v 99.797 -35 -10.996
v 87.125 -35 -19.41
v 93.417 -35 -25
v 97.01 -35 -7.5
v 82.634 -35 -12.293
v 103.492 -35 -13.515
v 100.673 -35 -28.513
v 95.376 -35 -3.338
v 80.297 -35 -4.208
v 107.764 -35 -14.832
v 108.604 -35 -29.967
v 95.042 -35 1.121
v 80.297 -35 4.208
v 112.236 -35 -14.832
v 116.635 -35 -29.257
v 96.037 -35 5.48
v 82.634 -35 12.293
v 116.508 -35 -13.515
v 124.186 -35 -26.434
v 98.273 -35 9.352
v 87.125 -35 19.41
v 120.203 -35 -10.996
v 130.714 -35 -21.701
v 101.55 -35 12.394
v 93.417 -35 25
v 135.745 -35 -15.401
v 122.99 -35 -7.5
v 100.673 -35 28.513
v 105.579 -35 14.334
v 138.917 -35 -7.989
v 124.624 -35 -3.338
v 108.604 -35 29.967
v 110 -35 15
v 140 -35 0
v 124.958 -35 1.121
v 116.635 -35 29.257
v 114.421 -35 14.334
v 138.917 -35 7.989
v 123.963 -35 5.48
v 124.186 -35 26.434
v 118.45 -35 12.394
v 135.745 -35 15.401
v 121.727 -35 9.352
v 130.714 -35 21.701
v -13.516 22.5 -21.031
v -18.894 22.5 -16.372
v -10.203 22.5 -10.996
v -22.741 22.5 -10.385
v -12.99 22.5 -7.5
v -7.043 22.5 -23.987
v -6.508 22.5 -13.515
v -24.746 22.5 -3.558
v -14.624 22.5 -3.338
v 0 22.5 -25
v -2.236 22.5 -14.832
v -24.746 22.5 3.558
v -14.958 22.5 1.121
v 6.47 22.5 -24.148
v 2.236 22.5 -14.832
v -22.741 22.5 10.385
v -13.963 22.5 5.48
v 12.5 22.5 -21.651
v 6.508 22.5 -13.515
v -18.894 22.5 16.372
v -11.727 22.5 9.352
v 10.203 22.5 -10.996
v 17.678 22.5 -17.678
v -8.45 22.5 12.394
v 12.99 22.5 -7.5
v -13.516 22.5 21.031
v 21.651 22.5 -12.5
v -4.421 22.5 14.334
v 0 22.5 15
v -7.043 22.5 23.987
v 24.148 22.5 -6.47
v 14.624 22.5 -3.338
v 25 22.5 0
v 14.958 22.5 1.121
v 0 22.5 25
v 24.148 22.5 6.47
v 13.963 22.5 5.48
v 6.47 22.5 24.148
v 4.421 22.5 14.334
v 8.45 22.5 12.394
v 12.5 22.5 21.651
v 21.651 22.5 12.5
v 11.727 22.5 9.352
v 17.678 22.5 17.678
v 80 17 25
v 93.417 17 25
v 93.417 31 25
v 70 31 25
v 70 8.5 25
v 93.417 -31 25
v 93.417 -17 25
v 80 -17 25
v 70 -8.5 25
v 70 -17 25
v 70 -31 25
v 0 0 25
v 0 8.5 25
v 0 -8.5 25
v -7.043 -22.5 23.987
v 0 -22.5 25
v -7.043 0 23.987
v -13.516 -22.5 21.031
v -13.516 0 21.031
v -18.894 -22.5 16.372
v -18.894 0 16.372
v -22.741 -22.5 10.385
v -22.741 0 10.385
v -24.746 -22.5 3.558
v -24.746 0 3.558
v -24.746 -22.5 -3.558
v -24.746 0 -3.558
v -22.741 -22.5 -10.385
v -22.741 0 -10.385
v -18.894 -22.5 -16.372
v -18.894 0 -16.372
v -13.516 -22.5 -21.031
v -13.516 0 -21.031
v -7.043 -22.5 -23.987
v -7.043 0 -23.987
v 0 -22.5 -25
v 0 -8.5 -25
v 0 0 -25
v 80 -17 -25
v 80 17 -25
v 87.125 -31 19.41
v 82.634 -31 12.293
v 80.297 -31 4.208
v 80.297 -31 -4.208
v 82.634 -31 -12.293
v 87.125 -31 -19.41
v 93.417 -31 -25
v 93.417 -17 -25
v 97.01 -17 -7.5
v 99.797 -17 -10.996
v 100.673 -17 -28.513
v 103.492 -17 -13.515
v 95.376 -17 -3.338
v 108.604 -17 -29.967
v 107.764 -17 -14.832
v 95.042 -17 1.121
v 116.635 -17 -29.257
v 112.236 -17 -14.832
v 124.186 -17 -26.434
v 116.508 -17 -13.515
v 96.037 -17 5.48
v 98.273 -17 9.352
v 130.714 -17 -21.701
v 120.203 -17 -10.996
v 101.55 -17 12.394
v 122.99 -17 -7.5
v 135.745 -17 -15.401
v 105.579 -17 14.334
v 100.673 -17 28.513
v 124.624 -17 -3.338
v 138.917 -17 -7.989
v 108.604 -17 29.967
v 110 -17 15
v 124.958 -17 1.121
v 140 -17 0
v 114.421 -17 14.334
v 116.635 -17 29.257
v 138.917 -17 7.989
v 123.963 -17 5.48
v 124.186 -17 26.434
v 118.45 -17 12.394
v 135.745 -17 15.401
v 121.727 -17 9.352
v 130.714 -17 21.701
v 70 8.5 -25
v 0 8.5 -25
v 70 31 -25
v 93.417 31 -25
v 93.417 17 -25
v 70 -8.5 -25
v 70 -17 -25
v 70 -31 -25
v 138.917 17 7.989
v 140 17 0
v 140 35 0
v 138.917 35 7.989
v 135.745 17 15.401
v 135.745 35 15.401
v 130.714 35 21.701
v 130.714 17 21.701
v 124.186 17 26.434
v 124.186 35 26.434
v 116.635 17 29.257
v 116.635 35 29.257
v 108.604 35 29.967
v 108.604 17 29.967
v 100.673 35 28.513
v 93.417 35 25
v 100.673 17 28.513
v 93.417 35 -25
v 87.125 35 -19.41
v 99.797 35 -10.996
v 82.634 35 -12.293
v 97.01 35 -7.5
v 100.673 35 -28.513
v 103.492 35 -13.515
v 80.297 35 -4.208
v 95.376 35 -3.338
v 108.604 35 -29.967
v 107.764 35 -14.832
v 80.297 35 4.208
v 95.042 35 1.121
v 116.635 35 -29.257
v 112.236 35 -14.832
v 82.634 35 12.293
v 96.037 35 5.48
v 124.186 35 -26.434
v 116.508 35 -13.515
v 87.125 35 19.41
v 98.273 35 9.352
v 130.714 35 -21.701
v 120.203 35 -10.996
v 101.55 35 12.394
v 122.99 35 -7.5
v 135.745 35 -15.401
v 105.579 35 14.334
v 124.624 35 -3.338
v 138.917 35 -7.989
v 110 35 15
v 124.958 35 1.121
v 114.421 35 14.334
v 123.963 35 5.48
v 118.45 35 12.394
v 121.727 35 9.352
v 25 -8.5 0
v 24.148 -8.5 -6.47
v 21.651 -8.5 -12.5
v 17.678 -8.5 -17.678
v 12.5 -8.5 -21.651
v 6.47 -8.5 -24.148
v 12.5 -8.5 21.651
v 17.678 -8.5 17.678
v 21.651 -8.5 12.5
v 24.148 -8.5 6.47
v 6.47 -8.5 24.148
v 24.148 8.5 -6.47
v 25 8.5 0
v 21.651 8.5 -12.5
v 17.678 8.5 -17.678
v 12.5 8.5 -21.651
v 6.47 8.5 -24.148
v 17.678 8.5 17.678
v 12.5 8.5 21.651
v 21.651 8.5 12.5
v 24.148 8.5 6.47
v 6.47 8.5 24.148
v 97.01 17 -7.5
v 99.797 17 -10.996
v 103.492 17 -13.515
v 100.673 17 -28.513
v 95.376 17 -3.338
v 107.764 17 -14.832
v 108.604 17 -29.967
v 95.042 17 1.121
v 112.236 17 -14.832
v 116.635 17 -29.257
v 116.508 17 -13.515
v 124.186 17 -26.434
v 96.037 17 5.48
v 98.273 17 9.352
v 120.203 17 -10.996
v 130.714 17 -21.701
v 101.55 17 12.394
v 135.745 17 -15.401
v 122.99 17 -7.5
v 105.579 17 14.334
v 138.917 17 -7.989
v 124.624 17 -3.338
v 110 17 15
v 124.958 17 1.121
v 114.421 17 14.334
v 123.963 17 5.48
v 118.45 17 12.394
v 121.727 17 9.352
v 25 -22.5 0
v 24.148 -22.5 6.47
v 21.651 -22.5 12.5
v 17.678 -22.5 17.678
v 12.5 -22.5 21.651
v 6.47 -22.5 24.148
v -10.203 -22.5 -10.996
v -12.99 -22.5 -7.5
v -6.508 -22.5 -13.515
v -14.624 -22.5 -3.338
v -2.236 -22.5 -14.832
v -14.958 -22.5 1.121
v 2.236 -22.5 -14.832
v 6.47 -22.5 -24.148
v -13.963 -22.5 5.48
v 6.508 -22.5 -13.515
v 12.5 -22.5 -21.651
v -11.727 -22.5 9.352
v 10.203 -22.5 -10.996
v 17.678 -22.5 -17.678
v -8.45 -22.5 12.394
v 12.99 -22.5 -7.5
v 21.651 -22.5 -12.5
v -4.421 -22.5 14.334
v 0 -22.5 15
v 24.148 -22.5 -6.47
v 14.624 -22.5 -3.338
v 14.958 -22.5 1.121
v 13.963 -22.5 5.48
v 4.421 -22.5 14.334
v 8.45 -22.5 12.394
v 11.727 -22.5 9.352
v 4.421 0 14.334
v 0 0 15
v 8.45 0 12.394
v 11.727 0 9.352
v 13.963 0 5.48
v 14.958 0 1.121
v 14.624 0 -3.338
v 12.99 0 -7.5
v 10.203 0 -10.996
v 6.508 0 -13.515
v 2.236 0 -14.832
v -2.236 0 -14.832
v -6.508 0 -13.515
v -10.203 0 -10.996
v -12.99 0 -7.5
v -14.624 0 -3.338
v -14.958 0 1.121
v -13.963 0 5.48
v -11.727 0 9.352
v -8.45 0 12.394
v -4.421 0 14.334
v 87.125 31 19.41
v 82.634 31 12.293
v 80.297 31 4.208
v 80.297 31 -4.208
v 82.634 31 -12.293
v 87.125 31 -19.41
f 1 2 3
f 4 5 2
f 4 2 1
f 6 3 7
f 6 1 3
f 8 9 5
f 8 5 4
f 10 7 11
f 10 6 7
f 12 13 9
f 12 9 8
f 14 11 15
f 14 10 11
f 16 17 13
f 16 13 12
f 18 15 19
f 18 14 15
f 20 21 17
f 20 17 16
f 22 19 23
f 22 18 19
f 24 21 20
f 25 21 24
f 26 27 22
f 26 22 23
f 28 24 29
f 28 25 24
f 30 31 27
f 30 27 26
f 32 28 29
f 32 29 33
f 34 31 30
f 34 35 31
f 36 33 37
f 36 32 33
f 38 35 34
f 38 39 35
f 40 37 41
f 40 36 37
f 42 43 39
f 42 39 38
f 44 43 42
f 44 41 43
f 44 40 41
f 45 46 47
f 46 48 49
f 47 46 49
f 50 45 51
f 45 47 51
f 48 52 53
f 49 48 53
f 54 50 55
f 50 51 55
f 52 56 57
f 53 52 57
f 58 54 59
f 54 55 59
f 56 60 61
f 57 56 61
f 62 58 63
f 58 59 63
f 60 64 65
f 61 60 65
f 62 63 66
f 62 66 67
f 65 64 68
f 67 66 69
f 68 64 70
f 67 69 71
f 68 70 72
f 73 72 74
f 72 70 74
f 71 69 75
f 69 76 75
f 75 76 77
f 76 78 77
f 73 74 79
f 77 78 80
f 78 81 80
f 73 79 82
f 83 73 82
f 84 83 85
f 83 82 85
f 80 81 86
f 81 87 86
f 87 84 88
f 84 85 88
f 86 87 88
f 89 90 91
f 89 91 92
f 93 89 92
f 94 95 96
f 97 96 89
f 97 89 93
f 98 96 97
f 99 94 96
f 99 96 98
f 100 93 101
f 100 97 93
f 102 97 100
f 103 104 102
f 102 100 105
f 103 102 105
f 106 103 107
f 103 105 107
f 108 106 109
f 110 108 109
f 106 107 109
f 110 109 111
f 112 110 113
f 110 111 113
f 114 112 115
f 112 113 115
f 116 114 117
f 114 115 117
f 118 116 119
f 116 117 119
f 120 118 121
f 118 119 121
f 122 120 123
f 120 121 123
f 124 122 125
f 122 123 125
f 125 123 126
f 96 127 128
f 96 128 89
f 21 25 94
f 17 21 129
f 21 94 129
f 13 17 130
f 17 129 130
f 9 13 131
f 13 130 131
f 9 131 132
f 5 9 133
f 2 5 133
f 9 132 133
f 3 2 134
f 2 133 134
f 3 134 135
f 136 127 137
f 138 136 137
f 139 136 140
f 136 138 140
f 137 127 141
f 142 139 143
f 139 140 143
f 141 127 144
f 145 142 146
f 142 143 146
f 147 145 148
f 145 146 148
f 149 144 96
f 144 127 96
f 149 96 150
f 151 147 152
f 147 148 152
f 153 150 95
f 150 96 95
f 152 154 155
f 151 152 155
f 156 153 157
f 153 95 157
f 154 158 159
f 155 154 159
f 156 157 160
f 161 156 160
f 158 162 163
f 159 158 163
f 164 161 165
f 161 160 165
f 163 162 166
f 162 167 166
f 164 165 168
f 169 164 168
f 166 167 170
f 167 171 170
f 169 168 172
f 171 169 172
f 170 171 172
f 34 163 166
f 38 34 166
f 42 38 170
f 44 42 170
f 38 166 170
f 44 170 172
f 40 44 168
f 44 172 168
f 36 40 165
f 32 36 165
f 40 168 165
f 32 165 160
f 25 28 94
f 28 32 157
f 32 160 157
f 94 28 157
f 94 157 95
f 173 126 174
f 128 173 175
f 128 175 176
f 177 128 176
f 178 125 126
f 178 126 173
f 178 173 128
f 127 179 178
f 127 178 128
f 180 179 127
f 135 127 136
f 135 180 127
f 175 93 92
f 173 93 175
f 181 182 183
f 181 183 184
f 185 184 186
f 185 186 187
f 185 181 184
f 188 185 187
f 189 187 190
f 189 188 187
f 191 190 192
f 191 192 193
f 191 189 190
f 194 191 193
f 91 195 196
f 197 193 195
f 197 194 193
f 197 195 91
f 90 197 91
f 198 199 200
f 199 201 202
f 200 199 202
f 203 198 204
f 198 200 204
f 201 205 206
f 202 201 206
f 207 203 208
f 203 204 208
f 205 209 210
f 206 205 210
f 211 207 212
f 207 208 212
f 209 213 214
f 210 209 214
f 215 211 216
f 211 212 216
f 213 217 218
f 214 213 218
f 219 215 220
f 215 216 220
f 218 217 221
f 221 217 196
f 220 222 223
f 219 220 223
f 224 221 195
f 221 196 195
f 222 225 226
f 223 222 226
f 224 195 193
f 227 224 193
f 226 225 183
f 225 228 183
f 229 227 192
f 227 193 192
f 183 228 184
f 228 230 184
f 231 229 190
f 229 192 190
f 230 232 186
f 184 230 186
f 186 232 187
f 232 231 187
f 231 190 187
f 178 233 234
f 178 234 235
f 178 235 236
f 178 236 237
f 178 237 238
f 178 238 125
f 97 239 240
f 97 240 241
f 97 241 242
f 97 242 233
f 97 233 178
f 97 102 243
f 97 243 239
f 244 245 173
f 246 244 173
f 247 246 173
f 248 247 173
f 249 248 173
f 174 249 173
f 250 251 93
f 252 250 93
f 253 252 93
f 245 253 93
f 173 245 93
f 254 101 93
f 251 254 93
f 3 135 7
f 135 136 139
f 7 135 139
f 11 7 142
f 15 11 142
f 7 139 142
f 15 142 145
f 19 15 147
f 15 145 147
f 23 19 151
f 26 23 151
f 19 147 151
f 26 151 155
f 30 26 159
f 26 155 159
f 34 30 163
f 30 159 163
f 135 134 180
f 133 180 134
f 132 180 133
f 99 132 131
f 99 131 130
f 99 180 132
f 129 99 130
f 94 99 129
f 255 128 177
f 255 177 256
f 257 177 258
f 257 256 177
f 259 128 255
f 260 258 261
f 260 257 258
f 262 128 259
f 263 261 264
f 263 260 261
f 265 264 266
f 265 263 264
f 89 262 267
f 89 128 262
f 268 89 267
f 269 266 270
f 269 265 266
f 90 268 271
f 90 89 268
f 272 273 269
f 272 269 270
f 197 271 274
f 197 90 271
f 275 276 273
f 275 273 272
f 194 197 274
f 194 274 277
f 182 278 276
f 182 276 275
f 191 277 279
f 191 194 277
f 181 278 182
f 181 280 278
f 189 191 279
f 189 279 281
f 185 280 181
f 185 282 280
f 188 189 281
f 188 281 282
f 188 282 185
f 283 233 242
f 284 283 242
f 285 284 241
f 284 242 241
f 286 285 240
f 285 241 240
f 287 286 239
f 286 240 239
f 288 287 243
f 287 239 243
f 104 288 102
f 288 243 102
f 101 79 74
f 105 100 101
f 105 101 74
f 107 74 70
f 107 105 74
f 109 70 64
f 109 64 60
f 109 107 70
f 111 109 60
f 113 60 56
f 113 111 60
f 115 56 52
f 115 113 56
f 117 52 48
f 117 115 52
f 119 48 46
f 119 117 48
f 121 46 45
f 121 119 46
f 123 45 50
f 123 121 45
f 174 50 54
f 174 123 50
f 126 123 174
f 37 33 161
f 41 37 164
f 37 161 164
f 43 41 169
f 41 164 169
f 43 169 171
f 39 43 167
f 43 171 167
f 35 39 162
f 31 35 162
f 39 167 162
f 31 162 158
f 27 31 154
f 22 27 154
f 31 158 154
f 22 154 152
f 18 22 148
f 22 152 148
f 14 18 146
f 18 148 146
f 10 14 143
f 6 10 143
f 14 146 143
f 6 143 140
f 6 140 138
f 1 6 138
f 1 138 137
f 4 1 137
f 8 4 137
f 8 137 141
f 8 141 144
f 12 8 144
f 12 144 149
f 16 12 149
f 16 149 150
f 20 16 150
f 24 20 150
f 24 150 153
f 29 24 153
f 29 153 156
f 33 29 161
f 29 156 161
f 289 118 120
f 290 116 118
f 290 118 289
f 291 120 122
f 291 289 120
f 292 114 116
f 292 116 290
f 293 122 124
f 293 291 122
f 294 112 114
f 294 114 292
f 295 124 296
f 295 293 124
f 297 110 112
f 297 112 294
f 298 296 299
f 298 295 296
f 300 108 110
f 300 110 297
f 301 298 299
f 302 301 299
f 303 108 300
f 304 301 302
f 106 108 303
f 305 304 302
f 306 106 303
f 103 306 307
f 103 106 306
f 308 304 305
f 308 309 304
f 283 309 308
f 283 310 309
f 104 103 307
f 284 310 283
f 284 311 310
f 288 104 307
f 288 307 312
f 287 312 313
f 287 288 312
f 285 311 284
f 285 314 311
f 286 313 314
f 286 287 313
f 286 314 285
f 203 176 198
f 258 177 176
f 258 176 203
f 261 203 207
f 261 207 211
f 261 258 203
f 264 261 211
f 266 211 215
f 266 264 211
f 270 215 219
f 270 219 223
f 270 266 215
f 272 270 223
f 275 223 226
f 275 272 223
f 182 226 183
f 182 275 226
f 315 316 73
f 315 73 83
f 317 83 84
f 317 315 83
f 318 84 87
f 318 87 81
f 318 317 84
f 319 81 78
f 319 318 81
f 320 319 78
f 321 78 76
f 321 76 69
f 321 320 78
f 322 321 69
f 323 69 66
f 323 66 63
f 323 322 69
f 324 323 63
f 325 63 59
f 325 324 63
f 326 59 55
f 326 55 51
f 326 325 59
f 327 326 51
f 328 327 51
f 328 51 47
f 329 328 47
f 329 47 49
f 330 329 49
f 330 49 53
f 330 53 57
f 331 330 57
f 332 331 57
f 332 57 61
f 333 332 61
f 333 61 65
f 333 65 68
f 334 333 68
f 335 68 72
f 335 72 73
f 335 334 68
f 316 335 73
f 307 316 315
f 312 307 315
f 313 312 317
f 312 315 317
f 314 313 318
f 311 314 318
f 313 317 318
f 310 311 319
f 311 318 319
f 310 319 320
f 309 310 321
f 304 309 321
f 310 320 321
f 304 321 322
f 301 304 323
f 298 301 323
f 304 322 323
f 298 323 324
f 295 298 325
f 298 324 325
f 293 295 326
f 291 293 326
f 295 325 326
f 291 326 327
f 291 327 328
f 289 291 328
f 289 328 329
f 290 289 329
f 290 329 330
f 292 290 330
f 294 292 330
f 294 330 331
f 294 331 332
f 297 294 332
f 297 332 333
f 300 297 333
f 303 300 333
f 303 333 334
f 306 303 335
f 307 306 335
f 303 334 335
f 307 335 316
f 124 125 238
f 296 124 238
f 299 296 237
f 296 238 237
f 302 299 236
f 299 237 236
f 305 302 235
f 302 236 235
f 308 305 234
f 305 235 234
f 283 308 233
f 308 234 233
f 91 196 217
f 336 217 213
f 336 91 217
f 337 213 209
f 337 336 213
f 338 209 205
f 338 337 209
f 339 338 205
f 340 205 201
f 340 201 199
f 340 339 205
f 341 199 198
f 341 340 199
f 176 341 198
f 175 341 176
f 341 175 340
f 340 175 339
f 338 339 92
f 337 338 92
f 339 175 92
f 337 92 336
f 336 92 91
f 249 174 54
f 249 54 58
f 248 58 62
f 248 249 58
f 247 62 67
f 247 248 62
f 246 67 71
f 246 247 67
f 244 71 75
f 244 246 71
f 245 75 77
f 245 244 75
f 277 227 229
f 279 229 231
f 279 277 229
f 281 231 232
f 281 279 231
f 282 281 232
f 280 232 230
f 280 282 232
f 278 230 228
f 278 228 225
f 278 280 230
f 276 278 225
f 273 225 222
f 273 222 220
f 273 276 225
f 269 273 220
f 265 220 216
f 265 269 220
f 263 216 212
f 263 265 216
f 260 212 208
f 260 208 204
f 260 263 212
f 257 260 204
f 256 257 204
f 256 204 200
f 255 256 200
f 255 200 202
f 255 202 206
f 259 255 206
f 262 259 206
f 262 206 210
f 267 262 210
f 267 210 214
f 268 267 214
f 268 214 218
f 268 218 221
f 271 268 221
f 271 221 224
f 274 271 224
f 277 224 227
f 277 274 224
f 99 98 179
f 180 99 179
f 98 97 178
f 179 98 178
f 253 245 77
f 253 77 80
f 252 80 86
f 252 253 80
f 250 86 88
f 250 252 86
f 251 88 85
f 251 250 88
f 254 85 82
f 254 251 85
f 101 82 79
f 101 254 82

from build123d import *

# Parameters (mm, degrees)
F1_DEPTH = 22.5
F2_DEPTH = 8.5
F0_W     = 10
F0_H     = 50
F3_DEPTH = 17
F6_DEPTH = 14
F7_DEPTH = 18


with BuildPart() as f1:
    # F0 (on Front) → F1 (new body, symmetric)
    with BuildSketch(Plane.XZ):
        with BuildLine():
            Line((0, 15), (0, 25))
            ThreePointArc((0, 25), (-25, 0), (0, -25))
            Line((0, -25), (0, -15))
            ThreePointArc((0, -15), (-15, 0), (0, 15))
        make_face()
        with BuildLine():
            ThreePointArc((0, -25), (17.6776695297, -17.6776695297), (25, 0))
            ThreePointArc((25, 0), (17.6776695297, 17.6776695297), (0, 25))
            Line((0, 25), (0, 15))
            ThreePointArc((0, 15), (10.6066017178, 10.6066017178), (15, 0))
            ThreePointArc((15, 0), (10.6066017178, -10.6066017178), (0, -15))
            Line((0, -15), (0, -25))
        make_face()
    extrude(amount=F1_DEPTH, both=True)

    # F0 (on Front) → F2 (join, symmetric)
    with BuildSketch(Plane.XZ):
        with BuildLine():
            ThreePointArc((0, 25), (17.6776695297, 17.6776695297), (25, 0))
            ThreePointArc((25, 0), (17.6776695297, -17.6776695297), (0, -25))
            Line((0, -25), (70, -25))
            Line((70, -25), (70, 25))
            Line((70, 25), (0, 25))
        make_face()
    extrude(amount=F2_DEPTH, both=True)

    # F0 (on Front) → F3 (join, symmetric)
    with BuildSketch(Plane.XZ):
        with Locations((75, 0)):
            Rectangle(F0_W, F0_H)
    extrude(amount=F3_DEPTH, both=True)

    # F5 (on offset) → F6 (join)
    with BuildSketch(Plane.XZ.offset(17)):
        with BuildLine():
            Line((93.4168760482, 25), (70, 25))
            Line((70, 25), (70, -25))
            Line((70, -25), (93.4168760482, -25))
            ThreePointArc((93.4168760482, -25), (80, 0), (93.4168760482, 25))
        make_face()
    extrude(amount=F6_DEPTH)

    # F5 (on offset) → F7 (join)
    with BuildSketch(Plane.XZ.offset(17)):
        with BuildLine():
            Line((110, 25), (93.4168760482, 25))
            ThreePointArc((93.4168760482, 25), (80, 0), (93.4168760482, -25))
            Line((93.4168760482, -25), (110, -25))
            Line((110, -25), (110, -15))
            ThreePointArc((110, -15), (95, 0), (110, 15))
            Line((110, 15), (110, 25))
        make_face()
        with BuildLine():
            ThreePointArc((140, 0), (124.1863716546, 26.4338203685), (93.4168760482, 25))
            Line((93.4168760482, 25), (110, 25))
            Line((110, 25), (110, 15))
            ThreePointArc((110, 15), (120.6066017178, 10.6066017178), (125, 0))
            ThreePointArc((125, 0), (120.6066017178, -10.6066017178), (110, -15))
            Line((110, -15), (110, -25))
            Line((110, -25), (93.4168760482, -25))
            ThreePointArc((93.4168760482, -25), (124.1863716546, -26.4338203685), (140, 0))
        make_face()
    extrude(amount=F7_DEPTH)

    # F8: F1 across plane


with BuildPart() as f1_1:
    add(f1.part)
    add(f1.part.mirror(Plane.XZ))


solid = f1_1.part
